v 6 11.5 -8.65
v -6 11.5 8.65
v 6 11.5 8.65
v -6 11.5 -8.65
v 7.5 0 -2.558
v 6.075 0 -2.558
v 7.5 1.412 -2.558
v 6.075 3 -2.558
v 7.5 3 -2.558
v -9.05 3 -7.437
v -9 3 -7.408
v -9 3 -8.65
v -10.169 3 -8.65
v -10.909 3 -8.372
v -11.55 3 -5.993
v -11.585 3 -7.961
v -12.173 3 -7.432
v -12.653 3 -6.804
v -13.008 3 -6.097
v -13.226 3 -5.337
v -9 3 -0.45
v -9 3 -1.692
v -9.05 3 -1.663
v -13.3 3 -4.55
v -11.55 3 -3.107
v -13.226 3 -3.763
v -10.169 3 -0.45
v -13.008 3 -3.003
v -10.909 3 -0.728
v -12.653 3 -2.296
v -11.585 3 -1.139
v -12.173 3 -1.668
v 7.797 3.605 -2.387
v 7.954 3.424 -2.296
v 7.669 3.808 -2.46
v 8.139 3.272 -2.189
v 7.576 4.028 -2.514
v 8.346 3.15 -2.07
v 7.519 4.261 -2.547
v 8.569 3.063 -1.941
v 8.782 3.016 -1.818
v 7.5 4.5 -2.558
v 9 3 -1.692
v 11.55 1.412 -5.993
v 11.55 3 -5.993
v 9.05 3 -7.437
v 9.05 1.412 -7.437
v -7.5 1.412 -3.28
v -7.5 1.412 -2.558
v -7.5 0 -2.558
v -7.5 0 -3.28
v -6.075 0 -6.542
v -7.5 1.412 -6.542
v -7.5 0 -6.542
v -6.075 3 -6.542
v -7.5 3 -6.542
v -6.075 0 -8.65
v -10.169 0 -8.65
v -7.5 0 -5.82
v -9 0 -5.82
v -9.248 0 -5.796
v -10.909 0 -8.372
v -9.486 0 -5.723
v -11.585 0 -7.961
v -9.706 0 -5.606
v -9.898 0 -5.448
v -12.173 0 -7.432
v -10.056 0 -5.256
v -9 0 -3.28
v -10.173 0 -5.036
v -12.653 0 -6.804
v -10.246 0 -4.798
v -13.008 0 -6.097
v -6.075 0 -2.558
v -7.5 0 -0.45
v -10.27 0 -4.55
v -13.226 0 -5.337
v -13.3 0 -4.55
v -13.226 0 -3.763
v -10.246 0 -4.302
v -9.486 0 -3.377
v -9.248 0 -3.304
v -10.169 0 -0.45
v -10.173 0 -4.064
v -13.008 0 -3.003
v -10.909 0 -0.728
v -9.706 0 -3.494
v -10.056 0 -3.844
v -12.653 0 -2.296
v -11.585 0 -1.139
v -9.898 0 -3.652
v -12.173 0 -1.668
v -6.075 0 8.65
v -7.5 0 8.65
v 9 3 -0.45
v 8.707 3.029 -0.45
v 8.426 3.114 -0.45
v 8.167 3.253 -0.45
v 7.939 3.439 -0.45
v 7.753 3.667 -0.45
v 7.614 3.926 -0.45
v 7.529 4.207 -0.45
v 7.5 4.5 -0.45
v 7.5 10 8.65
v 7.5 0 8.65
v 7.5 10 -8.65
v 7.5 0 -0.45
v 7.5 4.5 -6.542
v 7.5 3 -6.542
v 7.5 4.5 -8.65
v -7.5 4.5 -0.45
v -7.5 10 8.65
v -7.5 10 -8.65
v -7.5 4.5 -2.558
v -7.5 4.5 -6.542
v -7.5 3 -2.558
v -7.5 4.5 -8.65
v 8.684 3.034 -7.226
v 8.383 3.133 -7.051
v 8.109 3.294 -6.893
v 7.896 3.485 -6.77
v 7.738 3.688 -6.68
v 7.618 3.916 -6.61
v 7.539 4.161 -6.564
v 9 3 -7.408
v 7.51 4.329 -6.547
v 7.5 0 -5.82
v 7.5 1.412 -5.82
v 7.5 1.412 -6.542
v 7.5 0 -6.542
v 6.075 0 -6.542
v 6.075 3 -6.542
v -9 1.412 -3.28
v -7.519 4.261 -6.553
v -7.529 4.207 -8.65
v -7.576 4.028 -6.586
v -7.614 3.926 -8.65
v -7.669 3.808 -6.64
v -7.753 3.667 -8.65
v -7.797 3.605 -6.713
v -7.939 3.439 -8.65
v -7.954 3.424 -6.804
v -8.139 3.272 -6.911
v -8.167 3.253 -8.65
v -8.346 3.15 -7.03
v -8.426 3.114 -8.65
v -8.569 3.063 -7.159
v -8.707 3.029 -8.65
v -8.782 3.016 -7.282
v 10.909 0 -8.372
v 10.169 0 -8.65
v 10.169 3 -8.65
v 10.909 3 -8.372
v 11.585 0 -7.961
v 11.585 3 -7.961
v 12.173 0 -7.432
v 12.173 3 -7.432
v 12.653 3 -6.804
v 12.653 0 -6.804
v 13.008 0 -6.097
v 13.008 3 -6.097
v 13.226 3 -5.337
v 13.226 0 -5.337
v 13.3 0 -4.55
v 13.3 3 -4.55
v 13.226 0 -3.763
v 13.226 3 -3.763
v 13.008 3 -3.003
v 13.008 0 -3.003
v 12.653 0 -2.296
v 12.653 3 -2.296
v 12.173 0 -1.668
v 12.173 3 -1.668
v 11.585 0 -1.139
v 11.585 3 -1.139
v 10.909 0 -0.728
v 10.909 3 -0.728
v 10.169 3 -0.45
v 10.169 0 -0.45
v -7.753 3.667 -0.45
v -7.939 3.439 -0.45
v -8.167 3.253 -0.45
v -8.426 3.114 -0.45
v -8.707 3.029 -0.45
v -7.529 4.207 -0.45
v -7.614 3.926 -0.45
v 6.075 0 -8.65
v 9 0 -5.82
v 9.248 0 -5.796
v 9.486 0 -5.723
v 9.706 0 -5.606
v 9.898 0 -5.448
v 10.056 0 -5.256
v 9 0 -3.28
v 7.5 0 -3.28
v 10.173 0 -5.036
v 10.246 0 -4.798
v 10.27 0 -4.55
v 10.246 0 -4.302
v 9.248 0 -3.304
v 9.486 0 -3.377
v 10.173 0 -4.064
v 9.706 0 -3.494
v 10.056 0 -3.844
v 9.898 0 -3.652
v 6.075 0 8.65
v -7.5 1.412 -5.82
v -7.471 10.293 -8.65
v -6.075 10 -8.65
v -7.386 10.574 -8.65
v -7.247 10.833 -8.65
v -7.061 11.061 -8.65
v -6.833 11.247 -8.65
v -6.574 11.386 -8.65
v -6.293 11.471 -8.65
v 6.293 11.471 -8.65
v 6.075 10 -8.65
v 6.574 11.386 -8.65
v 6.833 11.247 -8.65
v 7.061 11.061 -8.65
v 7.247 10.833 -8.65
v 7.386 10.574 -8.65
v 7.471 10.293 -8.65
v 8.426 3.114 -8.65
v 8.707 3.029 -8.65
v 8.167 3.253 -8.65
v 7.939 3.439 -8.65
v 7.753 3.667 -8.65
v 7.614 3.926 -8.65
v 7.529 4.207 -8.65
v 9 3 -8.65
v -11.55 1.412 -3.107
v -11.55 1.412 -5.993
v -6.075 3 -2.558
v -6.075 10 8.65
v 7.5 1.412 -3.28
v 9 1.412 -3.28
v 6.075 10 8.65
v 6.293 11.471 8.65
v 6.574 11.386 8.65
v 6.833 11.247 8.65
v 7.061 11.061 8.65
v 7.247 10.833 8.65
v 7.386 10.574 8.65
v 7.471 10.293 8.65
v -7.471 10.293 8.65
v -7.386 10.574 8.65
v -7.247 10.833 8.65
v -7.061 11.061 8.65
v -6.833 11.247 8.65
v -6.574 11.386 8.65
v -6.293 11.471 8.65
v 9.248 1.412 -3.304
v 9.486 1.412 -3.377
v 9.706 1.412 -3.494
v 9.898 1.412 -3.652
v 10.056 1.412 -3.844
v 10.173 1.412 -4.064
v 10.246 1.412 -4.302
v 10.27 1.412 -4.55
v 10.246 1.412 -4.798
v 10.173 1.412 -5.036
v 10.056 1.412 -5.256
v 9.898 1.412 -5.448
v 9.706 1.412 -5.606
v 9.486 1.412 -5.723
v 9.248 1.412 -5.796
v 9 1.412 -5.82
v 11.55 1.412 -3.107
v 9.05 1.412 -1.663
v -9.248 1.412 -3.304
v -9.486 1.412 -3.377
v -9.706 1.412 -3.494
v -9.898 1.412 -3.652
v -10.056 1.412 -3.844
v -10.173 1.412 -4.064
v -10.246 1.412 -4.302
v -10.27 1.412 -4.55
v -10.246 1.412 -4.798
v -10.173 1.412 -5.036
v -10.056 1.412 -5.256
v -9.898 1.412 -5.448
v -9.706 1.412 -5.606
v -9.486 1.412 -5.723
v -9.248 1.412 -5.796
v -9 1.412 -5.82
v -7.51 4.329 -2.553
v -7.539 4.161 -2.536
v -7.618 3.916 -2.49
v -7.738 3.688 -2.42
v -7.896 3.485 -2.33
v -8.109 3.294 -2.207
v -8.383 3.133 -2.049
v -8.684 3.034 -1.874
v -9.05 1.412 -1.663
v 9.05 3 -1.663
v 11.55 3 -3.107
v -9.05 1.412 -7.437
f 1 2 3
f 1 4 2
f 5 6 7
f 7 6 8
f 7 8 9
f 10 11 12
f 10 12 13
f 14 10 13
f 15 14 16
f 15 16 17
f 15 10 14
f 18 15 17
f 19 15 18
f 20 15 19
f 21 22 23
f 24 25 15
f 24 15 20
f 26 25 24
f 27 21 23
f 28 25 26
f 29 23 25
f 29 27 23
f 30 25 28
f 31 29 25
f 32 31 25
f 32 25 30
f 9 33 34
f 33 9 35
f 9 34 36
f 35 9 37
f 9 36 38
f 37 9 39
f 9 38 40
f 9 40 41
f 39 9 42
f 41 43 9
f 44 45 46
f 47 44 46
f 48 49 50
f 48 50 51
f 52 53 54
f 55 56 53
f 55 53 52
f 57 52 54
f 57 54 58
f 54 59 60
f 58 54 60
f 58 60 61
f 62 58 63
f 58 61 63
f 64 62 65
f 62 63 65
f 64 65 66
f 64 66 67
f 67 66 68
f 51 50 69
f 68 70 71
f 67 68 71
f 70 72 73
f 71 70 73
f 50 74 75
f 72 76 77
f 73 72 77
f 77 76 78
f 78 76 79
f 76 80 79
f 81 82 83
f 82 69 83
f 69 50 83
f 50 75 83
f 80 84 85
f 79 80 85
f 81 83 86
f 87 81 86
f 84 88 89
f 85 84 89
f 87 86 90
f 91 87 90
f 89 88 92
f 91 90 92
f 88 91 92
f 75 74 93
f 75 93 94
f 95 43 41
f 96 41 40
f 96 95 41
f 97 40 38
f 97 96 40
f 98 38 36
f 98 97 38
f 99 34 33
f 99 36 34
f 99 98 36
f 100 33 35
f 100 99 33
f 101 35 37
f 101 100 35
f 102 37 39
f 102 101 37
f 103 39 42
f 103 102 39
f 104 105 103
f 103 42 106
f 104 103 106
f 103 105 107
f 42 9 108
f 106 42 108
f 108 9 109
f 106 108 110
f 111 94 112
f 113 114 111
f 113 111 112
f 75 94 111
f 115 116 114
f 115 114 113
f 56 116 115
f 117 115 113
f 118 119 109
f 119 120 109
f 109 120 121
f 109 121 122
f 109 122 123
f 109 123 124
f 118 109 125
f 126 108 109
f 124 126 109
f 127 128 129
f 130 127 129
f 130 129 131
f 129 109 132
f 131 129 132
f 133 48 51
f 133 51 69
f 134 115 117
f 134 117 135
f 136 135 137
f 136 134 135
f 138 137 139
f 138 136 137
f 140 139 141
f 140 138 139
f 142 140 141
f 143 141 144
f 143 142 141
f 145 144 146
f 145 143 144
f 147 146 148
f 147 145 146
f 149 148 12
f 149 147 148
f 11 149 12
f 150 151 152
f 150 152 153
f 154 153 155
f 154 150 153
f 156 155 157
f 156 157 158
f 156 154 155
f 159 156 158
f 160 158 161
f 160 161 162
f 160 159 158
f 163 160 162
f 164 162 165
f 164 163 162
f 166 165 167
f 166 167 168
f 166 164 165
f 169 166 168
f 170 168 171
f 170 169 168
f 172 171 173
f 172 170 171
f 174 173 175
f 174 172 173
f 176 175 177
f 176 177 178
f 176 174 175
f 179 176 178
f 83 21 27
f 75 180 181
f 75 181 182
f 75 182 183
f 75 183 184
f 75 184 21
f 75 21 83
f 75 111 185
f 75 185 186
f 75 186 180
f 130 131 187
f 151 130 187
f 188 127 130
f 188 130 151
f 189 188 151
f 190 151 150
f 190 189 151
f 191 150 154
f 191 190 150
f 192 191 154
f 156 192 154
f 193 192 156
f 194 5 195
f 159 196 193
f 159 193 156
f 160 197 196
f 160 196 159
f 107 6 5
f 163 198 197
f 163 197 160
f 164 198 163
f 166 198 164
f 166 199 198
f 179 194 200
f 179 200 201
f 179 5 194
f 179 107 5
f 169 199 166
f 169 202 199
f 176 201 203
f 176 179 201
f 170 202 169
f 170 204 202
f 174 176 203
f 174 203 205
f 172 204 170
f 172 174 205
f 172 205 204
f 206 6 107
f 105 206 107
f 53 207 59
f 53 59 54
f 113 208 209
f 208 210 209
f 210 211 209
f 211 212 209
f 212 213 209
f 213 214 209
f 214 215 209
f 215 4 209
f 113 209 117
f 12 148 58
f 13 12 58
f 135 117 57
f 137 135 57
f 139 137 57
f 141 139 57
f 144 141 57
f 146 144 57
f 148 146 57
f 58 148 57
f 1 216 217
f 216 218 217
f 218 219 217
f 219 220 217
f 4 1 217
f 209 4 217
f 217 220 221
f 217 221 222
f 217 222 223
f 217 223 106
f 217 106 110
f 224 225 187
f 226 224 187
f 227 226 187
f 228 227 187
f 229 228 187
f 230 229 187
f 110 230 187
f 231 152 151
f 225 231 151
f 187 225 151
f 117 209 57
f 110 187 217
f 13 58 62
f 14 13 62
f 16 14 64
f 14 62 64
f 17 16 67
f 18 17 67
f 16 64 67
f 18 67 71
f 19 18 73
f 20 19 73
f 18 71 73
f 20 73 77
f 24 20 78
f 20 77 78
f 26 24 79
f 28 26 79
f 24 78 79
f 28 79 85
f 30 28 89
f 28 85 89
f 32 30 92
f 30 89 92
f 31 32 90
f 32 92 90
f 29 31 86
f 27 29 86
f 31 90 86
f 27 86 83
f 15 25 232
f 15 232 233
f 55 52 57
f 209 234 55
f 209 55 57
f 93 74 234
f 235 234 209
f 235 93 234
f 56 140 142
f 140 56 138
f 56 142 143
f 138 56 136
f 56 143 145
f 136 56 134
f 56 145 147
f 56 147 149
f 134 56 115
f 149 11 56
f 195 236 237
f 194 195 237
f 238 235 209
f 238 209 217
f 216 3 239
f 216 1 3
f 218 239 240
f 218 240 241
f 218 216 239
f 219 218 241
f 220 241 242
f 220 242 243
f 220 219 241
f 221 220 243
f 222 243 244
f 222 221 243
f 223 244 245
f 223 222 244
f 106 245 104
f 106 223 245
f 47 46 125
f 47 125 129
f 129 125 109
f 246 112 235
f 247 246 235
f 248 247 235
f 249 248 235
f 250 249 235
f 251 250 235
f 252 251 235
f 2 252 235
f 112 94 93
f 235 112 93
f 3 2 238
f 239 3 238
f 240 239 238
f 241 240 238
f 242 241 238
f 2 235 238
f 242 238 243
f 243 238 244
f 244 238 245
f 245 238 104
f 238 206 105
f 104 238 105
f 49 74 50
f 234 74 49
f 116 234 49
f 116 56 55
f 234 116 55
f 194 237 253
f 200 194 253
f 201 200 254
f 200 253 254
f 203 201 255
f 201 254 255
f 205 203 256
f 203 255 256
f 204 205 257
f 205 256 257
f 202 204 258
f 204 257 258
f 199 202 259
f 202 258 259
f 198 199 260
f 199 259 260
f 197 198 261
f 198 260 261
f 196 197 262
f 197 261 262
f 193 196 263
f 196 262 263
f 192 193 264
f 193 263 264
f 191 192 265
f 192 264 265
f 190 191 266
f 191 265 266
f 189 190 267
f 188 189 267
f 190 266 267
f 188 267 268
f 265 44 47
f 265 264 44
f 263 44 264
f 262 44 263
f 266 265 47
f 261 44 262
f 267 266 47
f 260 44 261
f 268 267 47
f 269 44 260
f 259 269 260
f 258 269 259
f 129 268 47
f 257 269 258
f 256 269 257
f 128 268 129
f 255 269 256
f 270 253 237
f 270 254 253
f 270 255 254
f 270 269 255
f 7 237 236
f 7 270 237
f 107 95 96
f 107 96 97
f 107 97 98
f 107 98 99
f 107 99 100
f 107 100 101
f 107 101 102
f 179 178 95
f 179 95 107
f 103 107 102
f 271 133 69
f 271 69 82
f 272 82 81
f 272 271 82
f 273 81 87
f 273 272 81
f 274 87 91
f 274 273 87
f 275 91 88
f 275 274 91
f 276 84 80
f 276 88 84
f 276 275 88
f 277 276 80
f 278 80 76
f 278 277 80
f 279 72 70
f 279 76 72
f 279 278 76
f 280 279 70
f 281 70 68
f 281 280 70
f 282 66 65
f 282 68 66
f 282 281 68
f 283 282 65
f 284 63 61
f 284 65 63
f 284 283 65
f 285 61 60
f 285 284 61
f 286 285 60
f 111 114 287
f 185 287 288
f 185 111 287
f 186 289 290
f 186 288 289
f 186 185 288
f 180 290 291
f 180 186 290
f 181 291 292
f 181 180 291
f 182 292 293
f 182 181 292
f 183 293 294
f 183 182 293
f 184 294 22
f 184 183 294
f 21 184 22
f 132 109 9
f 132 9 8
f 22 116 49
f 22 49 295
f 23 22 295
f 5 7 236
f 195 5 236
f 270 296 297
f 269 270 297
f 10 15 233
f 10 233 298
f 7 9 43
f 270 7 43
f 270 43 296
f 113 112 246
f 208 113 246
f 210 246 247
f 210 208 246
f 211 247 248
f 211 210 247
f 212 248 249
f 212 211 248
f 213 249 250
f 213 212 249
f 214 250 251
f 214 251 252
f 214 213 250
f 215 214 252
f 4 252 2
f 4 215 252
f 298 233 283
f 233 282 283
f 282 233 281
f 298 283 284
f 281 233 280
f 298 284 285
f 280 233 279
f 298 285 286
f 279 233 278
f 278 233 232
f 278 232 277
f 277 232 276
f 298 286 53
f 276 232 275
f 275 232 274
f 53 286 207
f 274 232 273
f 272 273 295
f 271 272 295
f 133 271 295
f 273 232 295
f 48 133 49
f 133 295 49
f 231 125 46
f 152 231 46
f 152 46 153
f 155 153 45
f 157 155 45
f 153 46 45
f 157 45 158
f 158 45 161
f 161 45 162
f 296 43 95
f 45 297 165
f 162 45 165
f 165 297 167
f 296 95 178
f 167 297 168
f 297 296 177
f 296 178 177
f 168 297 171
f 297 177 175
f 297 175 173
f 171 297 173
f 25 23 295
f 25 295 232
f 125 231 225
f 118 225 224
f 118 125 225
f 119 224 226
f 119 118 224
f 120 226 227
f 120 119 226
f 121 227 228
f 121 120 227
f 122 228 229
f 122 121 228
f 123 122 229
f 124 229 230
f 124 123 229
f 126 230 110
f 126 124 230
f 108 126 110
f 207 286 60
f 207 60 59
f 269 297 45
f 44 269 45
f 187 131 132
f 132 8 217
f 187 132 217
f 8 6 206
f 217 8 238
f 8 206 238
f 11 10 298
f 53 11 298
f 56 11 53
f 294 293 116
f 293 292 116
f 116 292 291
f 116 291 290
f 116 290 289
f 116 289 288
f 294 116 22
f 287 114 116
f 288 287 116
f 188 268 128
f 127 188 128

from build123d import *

# Parameters (mm, degrees)
SKETCH1_W          = 15
SKETCH1_H          = 17.3
EXTRUDE1_DEPTH     = 11.5
SKETCH2_W          = 12.15
SKETCH2_H          = 10
EXTRUDE2_DEPTH     = 17.3
EXTRUDE3_DEPTH     = 3
CUT_EXTRUDE3_DEPTH = 1.5875
CUT_EXTRUDE1_DEPTH = 18.998958303
FILLET3_R          = 1.5
FILLET1_R          = 1.5


with BuildPart() as part:
    # Sketch1 → Extrude1 (new body)
    with BuildSketch(Plane(origin=(0, 0, 0), x_dir=(1, 0, 0), z_dir=(0, 1, 0))):
        Rectangle(SKETCH1_W, SKETCH1_H)
    extrude(amount=EXTRUDE1_DEPTH)

    # Sketch2 → Extrude2 (cut)
    with BuildSketch(Plane.XY.offset(8.65)):
        with Locations((0, 5)):
            Rectangle(SKETCH2_W, SKETCH2_H)
    extrude(amount=-EXTRUDE2_DEPTH, mode=Mode.SUBTRACT)

    # Sketch3 → Extrude3 (add)
    with BuildSketch(Plane.XZ):
        with BuildLine():
            Line((7.5, -8.65), (10.169151464, -8.65))
            ThreePointArc((10.169151464, -8.65), (13.3, -4.55), (10.169151464, -0.45))
            Line((10.169151464, -0.45), (7.5, -0.45))
            Line((7.5, -0.45), (7.5, -8.65))
        make_face()
    extrude3 = extrude(amount=-EXTRUDE3_DEPTH)

    # Sketch8 → Cut-Extrude3 (cut)
    with BuildSketch(Plane(origin=(0, 3, 0), x_dir=(-1, 0, 0), z_dir=(0, 1, 0))):
        Polygon((-11.55, -5.993375673), (-9.05, -7.436751346), (-6.55, -5.993375673), (-6.55, -3.106624327), (-9.05, -1.663248654), (-11.55, -3.106624327), align=None)
    cut_extrude3 = extrude(amount=-CUT_EXTRUDE3_DEPTH, mode=Mode.SUBTRACT)

    # Sketch5 → Cut-Extrude1 (cut, through all)
    with BuildSketch(Plane.XZ.offset(-3)):
        with BuildLine():
            Line((9, -5.82), (7.5, -5.82))
            Line((7.5, -5.82), (7.5, -6.541858429))
            Line((7.5, -6.541858429), (6.075, -6.541858429))
            Line((6.075, -6.541858429), (6.075, -2.558141571))
            Line((6.075, -2.558141571), (7.5, -2.558141571))
            Line((7.5, -2.558141571), (7.5, -3.28))
            Line((7.5, -3.28), (9, -3.28))
            ThreePointArc((9, -3.28), (10.27, -4.55), (9, -5.82))
        make_face()
    cut_extrude1 = extrude(amount=CUT_EXTRUDE1_DEPTH, mode=Mode.SUBTRACT)

    # Mirror3: Extrude3, Cut-Extrude3, Cut-Extrude1 across plane
    add(extrude3.mirror(Plane(origin=(0, 0, 0), x_dir=(0, 0, 1), z_dir=(1, 0, 0))))
    add(cut_extrude3.mirror(Plane(origin=(0, 0, 0), x_dir=(0, 0, 1), z_dir=(1, 0, 0))), mode=Mode.SUBTRACT)
    add(cut_extrude1.mirror(Plane(origin=(0, 0, 0), x_dir=(0, 0, 1), z_dir=(1, 0, 0))), mode=Mode.SUBTRACT)

    # Fillet3
    fillet3_edges = [part.edges().sort_by_distance(p)[0] for p in [
        (-7.5, 11.5, 0),
        (7.5, 11.5, 0),
    ]]
    fillet(fillet3_edges, radius=FILLET3_R)

    # Fillet1
    # the kernel refuses this fillet: 1.5 mm, written as the material it adds along each edge
    with BuildSketch(Plane(origin=(7.5, 3, -0.45), x_dir=(0, 1, 0), z_dir=(0, 0, -1))) as fillet1_piece_1_section:
        with BuildLine():
            CenterArc((FILLET1_R, FILLET1_R), FILLET1_R, 180, 90)
            Line((0, FILLET1_R), (0, 0))
            Line((0, 0), (FILLET1_R, 0))
        make_face()
    fillet1_piece_1 = extrude(amount=5.858141571, mode=Mode.PRIVATE)
    fillet1_piece_1 = split(fillet1_piece_1, bisect_by=Plane(origin=(8.228724566, 3.349084614, -2.137412247), z_dir=(-0.5000000000000001, 0, 0.8660254037844386)), keep=Keep.TOP, mode=Mode.PRIVATE)
    add(fillet1_piece_1)
    with BuildSketch(Plane(origin=(7.5, 3, -2.791858429), x_dir=(0, 1, 0), z_dir=(0, 0, -1))) as fillet1_piece_2_section:
        with BuildLine():
            CenterArc((FILLET1_R, FILLET1_R), FILLET1_R, 180, 90)
            Line((0, FILLET1_R), (0, 0))
            Line((0, 0), (FILLET1_R, 0))
        make_face()
    fillet1_piece_2 = extrude(amount=5.858141571, mode=Mode.PRIVATE)
    fillet1_piece_2 = split(fillet1_piece_2, bisect_by=Plane(origin=(8.228724566, 3.349084614, -6.962587753), z_dir=(-0.5000000000000002, 0, -0.8660254037844386)), keep=Keep.TOP, mode=Mode.PRIVATE)
    add(fillet1_piece_2)
    with BuildSketch(Plane(origin=(-7.5, 3, -2.791858429), x_dir=(0, 1, 0), z_dir=(0, 0, -1))) as fillet1_piece_3_section:
        with BuildLine():
            CenterArc((FILLET1_R, -FILLET1_R), FILLET1_R, 90, 90)
            Line((0, -FILLET1_R), (0, 0))
            Line((0, 0), (FILLET1_R, 0))
        make_face()
    fillet1_piece_3 = extrude(amount=5.858141571, mode=Mode.PRIVATE)
    fillet1_piece_3 = split(fillet1_piece_3, bisect_by=Plane(origin=(-8.228724566, 3.349084614, -6.962587753), z_dir=(0.5000000000000002, 0, -0.8660254037844386)), keep=Keep.TOP, mode=Mode.PRIVATE)
    add(fillet1_piece_3)
    with BuildSketch(Plane(origin=(-7.5, 3, -0.45), x_dir=(0, 1, 0), z_dir=(0, 0, -1))) as fillet1_piece_4_section:
        with BuildLine():
            CenterArc((FILLET1_R, -FILLET1_R), FILLET1_R, 90, 90)
            Line((0, -FILLET1_R), (0, 0))
            Line((0, 0), (FILLET1_R, 0))
        make_face()
    fillet1_piece_4 = extrude(amount=5.858141571, mode=Mode.PRIVATE)
    fillet1_piece_4 = split(fillet1_piece_4, bisect_by=Plane(origin=(-8.228724566, 3.349084614, -2.137412247), z_dir=(0.5000000000000001, 0, 0.8660254037844386)), keep=Keep.TOP, mode=Mode.PRIVATE)
    add(fillet1_piece_4)


solid = part.part
